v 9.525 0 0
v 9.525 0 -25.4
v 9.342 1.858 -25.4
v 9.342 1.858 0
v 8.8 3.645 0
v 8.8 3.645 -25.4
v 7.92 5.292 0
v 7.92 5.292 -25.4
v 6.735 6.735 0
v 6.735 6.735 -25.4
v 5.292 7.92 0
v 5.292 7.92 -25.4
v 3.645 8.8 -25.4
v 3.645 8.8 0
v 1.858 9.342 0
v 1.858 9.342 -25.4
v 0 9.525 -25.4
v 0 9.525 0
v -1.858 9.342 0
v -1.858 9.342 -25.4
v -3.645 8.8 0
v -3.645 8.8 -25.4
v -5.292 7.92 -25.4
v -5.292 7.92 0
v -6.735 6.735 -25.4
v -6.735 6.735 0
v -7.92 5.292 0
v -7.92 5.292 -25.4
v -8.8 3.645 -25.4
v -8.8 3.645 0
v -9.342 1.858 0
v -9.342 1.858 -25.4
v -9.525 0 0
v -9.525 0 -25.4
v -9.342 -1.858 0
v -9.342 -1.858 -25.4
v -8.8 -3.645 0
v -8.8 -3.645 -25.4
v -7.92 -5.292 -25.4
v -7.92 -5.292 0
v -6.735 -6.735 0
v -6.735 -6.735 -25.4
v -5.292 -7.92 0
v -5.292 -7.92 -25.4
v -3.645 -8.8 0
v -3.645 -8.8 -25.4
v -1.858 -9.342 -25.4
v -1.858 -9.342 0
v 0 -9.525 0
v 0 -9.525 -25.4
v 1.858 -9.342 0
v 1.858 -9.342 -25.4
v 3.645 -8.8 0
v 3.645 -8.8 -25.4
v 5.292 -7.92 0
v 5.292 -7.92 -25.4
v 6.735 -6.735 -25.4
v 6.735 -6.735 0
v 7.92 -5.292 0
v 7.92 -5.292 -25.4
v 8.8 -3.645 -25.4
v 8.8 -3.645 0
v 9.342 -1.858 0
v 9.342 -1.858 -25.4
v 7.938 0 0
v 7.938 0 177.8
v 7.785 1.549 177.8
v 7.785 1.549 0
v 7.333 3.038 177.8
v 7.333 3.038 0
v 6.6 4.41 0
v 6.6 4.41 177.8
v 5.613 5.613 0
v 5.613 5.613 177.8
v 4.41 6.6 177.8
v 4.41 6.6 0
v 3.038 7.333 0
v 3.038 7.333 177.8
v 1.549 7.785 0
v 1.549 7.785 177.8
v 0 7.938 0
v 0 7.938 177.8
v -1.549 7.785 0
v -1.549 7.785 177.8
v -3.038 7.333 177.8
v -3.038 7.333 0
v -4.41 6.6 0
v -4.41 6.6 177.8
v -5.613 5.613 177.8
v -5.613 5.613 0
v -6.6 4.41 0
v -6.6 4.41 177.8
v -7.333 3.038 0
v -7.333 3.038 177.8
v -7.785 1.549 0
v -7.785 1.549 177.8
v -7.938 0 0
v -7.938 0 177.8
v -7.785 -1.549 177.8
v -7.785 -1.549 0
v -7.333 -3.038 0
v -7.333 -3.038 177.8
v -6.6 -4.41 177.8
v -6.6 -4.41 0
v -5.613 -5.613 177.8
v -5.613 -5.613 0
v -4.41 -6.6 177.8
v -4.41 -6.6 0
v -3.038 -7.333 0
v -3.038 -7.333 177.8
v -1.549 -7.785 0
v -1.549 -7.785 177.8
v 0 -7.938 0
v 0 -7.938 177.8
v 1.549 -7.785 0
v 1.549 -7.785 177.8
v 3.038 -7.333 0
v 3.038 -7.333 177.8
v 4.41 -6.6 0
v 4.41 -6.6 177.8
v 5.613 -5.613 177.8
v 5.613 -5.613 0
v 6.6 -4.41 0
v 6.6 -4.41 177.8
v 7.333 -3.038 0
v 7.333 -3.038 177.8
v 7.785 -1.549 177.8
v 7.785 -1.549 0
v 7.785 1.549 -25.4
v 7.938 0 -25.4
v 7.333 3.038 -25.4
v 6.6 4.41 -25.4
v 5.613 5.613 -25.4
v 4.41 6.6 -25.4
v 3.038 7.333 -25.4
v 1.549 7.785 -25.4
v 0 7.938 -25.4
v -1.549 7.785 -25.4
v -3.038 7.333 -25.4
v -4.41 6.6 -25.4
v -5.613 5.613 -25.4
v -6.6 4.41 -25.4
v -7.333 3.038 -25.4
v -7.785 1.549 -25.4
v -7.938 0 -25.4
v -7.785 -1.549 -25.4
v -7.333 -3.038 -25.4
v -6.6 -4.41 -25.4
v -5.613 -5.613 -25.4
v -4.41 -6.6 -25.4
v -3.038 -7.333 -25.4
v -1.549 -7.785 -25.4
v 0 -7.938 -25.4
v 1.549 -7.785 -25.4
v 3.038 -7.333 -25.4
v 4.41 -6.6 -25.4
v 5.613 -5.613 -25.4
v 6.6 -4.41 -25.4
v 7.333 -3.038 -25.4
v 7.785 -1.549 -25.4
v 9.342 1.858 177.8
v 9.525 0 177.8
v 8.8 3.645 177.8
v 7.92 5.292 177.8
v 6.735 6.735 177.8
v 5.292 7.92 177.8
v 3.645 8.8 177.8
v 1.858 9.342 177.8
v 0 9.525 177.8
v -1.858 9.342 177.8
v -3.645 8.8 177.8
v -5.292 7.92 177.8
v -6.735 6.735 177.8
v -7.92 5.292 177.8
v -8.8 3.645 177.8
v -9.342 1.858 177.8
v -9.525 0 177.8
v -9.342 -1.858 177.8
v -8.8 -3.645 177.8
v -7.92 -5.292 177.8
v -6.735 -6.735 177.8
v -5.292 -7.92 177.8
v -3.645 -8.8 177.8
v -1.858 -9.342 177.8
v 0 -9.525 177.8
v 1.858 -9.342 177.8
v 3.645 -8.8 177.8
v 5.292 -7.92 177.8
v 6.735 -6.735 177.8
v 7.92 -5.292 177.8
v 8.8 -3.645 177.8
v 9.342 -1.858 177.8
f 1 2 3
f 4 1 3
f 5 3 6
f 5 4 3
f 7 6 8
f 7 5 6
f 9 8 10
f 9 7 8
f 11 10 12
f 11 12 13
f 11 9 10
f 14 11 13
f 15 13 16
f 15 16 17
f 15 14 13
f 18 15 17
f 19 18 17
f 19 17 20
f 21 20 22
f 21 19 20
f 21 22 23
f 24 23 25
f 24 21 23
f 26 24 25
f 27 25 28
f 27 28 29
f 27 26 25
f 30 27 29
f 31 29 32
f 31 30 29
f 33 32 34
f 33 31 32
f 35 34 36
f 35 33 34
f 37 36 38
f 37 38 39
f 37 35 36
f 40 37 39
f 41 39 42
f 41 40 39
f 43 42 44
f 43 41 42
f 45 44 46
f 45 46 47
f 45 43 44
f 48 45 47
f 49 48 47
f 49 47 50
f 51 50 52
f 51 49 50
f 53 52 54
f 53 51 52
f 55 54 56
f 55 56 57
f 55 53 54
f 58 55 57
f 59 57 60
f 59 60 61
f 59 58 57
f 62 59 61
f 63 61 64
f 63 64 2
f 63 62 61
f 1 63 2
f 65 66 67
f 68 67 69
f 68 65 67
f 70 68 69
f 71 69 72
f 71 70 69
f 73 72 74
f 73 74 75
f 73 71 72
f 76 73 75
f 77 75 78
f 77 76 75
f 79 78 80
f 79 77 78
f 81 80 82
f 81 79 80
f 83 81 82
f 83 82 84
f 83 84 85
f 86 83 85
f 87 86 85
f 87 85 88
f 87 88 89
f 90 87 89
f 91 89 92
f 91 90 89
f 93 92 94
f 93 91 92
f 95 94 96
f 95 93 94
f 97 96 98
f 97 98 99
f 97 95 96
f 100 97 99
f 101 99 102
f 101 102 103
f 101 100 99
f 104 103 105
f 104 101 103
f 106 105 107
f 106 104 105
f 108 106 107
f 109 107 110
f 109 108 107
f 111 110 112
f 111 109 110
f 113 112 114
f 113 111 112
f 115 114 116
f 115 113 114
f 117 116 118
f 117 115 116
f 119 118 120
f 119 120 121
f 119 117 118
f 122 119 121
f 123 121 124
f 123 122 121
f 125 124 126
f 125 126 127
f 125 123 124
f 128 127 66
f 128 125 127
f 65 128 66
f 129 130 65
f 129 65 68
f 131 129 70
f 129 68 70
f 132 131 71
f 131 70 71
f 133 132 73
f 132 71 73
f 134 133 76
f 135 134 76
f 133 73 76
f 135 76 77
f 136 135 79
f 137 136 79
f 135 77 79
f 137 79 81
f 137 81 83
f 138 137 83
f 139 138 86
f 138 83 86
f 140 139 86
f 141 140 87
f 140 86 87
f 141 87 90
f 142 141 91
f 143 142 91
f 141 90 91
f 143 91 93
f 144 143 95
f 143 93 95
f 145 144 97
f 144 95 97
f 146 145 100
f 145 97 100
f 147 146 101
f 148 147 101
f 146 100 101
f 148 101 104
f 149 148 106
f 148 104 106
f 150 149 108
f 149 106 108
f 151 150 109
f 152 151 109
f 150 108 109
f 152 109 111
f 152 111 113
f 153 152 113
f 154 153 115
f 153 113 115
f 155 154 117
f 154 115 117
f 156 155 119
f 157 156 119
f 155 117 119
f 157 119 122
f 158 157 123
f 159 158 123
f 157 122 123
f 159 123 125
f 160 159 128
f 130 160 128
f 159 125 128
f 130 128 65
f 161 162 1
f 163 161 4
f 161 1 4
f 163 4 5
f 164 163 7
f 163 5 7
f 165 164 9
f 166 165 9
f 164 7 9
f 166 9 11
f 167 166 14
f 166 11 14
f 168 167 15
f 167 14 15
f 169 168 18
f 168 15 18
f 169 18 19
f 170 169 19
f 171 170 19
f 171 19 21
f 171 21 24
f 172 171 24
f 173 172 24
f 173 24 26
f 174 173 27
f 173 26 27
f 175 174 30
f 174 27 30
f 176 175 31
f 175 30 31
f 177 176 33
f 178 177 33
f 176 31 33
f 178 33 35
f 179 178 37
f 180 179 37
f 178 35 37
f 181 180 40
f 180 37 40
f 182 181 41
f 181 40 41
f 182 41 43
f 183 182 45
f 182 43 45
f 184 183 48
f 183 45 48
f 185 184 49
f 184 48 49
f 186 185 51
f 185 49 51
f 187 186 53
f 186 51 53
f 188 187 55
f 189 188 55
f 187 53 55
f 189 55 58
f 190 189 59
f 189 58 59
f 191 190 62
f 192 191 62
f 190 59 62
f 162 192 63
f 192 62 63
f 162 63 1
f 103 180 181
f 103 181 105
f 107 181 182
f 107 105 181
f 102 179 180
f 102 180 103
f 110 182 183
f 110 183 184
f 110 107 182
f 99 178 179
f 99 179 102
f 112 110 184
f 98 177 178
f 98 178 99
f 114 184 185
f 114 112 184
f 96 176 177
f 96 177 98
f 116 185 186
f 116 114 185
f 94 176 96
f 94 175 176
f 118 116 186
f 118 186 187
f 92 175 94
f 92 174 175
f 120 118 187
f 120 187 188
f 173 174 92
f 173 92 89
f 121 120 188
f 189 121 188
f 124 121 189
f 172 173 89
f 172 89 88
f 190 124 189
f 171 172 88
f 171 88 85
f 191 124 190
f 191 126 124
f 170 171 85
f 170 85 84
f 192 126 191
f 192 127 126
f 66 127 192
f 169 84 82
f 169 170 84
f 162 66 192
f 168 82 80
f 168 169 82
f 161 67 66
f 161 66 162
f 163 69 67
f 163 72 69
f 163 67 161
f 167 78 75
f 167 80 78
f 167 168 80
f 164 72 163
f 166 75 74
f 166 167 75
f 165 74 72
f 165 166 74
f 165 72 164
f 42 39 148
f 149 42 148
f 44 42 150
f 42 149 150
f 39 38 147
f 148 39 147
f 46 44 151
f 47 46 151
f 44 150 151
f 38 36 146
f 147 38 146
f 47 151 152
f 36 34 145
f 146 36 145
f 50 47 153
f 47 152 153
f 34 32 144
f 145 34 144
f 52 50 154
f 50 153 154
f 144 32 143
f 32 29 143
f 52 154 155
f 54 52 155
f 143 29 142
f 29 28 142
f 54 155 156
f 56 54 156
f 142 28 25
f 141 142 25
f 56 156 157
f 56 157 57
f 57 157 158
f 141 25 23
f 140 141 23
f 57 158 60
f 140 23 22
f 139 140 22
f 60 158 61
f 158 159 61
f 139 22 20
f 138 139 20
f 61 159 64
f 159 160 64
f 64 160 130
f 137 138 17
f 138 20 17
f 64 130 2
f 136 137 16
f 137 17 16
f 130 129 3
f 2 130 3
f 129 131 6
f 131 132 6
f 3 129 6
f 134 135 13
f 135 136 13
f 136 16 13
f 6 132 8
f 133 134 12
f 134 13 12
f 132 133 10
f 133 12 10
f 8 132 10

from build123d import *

# Parameters (mm, degrees)
F0_R     = 9.525
F0_R_2   = 7.9375
F1_DEPTH = 152.4
F2_DEPTH = 25.4
F3_DEPTH = 25.4


with BuildPart() as f1:
    # F0 (on Top) → F1 (new body)
    with BuildSketch(Plane.XY):
        Circle(F0_R)
        Circle(F0_R_2, mode=Mode.SUBTRACT)
    extrude(amount=F1_DEPTH)

    # F2 (add): a face of the model
    f2_faces = [f1.faces().sort_by_distance(p)[0] for p in [
        (-9.2555923164, 0, 152.4),
    ]]
    extrude(f2_faces, amount=F2_DEPTH)

    # F3 (add): a face of the model
    f3_faces = [f1.faces().sort_by_distance(p)[0] for p in [
        (-9.2555923164, 0, 0),
    ]]
    extrude(f3_faces, amount=F3_DEPTH)


solid = f1.part
